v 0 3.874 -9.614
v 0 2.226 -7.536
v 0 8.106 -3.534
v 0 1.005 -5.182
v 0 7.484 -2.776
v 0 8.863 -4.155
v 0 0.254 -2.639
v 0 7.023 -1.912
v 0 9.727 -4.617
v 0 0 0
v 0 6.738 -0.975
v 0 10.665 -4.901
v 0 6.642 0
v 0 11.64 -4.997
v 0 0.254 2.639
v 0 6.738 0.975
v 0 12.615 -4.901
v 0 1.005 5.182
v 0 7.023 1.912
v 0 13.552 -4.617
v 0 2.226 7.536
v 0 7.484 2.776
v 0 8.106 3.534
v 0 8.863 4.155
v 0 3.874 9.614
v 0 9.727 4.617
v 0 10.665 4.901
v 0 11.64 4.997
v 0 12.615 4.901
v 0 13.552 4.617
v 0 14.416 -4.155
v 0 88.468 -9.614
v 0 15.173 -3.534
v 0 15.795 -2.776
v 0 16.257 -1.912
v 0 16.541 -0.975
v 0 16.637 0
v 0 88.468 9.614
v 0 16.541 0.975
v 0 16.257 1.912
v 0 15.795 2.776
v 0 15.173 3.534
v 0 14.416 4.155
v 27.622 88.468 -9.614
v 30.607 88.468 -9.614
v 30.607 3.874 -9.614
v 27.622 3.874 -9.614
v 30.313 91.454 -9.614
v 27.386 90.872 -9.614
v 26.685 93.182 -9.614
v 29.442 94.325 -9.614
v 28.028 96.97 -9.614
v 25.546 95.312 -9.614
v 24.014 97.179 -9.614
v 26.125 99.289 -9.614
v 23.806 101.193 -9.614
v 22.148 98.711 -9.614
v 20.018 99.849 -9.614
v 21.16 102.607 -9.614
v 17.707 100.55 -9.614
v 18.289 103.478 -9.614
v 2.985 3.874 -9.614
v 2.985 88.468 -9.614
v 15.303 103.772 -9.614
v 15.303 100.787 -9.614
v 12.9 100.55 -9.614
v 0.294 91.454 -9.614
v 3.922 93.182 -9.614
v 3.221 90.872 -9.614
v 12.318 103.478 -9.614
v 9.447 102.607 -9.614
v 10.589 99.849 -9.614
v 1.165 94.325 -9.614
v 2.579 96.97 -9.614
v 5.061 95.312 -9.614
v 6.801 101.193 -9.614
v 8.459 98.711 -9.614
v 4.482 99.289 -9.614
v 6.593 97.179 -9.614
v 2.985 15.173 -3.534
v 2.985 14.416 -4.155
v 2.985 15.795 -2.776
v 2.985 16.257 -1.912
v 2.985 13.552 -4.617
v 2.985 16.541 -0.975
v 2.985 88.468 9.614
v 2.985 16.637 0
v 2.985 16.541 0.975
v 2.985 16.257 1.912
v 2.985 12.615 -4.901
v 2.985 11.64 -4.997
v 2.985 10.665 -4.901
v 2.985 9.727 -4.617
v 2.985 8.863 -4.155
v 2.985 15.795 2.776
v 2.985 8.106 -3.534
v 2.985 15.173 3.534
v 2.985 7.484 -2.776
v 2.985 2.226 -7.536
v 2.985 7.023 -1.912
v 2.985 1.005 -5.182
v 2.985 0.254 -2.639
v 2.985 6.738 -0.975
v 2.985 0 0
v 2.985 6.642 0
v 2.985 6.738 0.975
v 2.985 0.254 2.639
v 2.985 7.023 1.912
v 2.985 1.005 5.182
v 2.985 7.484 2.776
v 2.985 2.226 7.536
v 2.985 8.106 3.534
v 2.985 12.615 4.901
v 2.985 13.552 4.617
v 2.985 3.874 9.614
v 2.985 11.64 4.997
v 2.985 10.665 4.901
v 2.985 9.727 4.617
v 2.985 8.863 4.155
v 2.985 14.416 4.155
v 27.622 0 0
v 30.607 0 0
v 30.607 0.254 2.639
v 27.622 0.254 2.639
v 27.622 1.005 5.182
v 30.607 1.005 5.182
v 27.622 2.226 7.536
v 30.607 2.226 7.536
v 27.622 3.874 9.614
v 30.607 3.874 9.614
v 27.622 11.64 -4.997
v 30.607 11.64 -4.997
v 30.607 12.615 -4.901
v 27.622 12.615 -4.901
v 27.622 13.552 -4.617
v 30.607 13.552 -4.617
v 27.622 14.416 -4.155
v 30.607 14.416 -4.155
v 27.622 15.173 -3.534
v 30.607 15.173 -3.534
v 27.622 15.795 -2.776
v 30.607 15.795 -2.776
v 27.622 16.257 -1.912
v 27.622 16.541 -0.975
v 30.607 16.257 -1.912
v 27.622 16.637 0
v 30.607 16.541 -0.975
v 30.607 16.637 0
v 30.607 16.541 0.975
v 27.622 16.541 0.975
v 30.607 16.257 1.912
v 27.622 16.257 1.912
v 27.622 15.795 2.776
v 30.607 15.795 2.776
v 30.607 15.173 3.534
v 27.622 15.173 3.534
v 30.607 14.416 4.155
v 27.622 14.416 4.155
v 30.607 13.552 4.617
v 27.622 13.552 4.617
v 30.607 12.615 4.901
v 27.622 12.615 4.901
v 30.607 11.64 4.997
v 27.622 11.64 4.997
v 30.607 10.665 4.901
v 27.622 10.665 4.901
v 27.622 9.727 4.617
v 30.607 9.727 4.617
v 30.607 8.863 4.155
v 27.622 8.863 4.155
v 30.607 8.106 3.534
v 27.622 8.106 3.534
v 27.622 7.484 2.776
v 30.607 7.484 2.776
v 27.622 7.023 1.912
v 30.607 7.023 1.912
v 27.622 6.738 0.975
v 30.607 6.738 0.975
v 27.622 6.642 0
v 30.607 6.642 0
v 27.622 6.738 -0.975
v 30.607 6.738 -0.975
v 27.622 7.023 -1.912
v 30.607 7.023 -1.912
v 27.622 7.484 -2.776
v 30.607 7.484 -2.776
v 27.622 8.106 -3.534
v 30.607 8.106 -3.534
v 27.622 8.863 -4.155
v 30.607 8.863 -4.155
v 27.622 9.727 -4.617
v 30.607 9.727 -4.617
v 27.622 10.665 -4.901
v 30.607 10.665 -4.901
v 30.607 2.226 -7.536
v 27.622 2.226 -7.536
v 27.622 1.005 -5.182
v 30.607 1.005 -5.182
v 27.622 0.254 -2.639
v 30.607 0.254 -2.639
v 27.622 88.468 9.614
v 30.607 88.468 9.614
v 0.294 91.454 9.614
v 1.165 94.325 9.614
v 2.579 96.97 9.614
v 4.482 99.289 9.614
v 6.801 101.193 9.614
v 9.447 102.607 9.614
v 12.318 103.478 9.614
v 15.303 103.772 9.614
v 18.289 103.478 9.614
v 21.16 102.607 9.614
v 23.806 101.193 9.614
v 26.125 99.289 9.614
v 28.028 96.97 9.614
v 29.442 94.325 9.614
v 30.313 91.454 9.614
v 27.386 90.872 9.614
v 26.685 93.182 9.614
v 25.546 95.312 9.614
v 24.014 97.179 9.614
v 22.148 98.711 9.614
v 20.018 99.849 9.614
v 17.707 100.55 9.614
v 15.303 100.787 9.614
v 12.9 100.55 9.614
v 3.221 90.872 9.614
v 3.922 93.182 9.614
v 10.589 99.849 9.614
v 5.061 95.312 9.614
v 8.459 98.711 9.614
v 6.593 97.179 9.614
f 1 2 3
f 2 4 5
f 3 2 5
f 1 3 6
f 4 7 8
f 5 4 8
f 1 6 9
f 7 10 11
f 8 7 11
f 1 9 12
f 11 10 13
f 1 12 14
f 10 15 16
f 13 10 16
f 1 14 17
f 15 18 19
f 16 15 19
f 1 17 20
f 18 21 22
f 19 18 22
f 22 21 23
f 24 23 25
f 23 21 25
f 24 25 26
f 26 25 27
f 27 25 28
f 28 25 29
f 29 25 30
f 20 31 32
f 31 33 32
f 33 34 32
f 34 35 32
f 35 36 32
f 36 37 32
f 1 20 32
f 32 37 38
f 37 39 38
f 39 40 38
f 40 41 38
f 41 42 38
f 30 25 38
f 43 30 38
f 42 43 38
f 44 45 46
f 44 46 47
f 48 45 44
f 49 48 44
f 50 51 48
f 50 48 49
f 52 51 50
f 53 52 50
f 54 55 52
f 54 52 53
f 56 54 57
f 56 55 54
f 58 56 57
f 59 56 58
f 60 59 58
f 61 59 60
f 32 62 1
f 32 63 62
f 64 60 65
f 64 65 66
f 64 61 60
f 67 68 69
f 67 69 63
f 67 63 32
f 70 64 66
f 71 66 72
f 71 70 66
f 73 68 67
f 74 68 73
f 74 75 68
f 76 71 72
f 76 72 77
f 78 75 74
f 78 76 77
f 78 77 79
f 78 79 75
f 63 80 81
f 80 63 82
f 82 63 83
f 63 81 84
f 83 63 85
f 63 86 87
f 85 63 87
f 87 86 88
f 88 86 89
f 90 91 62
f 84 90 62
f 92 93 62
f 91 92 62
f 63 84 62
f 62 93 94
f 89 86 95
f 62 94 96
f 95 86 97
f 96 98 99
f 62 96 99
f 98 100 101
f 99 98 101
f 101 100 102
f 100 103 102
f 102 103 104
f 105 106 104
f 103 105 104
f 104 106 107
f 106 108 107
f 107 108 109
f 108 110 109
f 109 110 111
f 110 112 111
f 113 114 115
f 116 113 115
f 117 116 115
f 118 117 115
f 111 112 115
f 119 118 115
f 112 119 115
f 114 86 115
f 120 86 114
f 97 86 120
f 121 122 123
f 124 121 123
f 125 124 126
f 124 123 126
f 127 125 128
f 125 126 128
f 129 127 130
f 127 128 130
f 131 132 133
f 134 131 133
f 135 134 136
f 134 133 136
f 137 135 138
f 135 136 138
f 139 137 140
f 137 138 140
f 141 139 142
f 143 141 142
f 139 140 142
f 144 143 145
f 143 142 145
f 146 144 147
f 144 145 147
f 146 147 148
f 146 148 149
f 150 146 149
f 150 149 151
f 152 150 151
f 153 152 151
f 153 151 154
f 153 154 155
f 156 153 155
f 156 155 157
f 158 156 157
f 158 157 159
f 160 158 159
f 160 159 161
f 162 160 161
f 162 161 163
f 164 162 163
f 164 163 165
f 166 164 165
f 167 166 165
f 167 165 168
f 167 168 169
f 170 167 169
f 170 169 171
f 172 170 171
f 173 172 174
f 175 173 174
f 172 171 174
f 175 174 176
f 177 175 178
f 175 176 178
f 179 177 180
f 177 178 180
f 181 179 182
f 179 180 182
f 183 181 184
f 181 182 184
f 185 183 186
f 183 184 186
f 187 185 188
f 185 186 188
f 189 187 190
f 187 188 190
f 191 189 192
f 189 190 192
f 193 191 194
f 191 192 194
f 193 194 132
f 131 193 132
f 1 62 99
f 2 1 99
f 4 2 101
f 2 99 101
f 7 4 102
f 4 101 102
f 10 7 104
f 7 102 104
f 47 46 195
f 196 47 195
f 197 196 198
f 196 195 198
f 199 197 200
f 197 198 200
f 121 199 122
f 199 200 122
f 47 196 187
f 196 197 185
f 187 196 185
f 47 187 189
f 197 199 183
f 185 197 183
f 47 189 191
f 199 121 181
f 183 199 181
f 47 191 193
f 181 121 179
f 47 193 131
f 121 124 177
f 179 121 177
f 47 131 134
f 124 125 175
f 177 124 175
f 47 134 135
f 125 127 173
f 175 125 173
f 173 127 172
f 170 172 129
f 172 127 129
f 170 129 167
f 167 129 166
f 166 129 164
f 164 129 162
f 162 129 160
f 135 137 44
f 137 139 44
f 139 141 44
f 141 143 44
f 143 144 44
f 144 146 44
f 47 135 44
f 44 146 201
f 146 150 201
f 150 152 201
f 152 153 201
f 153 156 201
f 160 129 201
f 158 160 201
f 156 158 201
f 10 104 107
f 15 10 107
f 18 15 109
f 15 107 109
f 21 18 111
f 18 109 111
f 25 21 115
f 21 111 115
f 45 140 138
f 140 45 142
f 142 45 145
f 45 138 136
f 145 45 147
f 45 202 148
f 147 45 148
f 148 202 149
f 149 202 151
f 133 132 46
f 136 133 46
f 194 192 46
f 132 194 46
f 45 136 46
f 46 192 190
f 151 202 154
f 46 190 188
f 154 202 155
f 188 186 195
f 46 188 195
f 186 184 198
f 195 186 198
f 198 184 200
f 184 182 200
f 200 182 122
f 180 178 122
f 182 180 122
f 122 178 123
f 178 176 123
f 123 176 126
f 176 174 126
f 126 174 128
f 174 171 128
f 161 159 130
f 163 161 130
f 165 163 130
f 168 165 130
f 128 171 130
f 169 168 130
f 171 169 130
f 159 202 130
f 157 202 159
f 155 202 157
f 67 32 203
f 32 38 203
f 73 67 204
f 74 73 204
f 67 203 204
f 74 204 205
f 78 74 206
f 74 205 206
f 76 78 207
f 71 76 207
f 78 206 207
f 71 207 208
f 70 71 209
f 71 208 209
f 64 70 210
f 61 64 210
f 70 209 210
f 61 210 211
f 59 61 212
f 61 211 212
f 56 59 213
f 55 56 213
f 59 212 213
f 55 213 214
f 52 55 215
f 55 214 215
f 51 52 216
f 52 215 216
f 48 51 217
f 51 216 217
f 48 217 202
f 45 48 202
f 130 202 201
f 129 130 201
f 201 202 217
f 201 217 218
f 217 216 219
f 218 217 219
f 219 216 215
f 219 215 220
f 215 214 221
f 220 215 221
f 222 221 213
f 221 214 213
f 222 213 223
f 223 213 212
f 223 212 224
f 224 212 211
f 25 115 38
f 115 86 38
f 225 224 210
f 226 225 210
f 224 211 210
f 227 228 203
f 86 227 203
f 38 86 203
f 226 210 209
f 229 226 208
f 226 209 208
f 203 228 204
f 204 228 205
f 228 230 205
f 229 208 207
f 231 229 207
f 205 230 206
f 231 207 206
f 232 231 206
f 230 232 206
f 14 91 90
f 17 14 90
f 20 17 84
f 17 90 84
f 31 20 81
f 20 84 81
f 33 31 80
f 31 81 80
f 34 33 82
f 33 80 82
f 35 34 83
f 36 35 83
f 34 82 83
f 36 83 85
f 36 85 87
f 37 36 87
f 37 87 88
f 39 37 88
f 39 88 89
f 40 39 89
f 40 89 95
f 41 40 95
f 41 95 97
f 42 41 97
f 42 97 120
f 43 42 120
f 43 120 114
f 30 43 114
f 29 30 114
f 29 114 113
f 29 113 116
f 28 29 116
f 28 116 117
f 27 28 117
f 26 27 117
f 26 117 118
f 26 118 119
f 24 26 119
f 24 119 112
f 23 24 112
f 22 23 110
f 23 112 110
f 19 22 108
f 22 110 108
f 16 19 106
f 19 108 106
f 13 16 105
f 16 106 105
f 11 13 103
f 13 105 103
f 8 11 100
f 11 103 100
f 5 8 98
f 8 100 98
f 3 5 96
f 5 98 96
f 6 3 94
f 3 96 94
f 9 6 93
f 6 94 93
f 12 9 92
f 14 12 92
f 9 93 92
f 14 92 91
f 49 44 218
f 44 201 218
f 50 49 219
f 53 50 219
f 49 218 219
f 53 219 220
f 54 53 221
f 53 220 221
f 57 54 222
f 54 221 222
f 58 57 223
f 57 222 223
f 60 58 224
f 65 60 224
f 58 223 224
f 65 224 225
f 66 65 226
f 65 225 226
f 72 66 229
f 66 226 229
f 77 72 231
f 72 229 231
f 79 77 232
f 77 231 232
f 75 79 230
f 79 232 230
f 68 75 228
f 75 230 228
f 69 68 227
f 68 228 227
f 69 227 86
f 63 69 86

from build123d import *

# Parameters (mm, degrees)
BOSS_EXTRUDE1_DEPTH     = 9.6139
SKETCH2_R               = 4.99745
CUT_EXTRUDE1_DEPTH      = 1
CUT_EXTRUDE1_DEPTH_BACK = 31.607
CUT_EXTRUDE2_DEPTH      = 1
CUT_EXTRUDE2_DEPTH_BACK = 31.607


with BuildPart() as part:
    # Sketch1 → Boss-Extrude1 (new body, symmetric)
    with BuildSketch(Plane.XY):
        with BuildLine():
            Line((0, 0), (0, 88.4682))
            ThreePointArc((0, 88.4682), (15.3035, 103.7717), (30.607, 88.4682))
            Line((30.607, 88.4682), (30.607, 0))
            Line((30.607, 0), (27.6225, 0))
            Line((27.6225, 0), (27.6225, 88.4682))
            ThreePointArc((27.6225, 88.4682), (15.3035, 100.7872), (2.9845, 88.4682))
            Line((2.9845, 88.4682), (2.9845, 0))
            Line((2.9845, 0), (0, 0))
        make_face()
    extrude(amount=BOSS_EXTRUDE1_DEPTH, both=True)

    # Sketch2 → Cut-Extrude1 (cut, two sides)
    with BuildSketch(Plane(origin=(30.607, 0, 0), x_dir=(0, 0, -1), z_dir=(1, 0, 0))) as cut_extrude1_sk:
        with Locations((0, 11.63955)):
            Circle(SKETCH2_R)
    extrude(amount=CUT_EXTRUDE1_DEPTH, mode=Mode.SUBTRACT)
    extrude(cut_extrude1_sk.sketch, amount=-CUT_EXTRUDE1_DEPTH_BACK, mode=Mode.SUBTRACT)

    # Sketch2<3> → Cut-Extrude2 (cut, two sides)
    with BuildSketch(Plane(origin=(30.607, 0, 0), x_dir=(0, 0, -1), z_dir=(1, 0, 0))) as cut_extrude2_sk:
        with BuildLine():
            ThreePointArc((0, 0), (-5.182448154, 1.004775894), (-9.6139, 3.8735))
            Line((-9.6139, 3.8735), (-9.6139, 0))
            Line((-9.6139, 0), (0, 0))
        make_face()
        with BuildLine():
            ThreePointArc((9.6139, 3.8735), (5.182448154, 1.004775894), (0, 0))
            Line((0, 0), (9.6139, 0))
            Line((9.6139, 0), (9.6139, 3.8735))
        make_face()
    extrude(amount=CUT_EXTRUDE2_DEPTH, mode=Mode.SUBTRACT)
    extrude(cut_extrude2_sk.sketch, amount=-CUT_EXTRUDE2_DEPTH_BACK, mode=Mode.SUBTRACT)


solid = part.part
